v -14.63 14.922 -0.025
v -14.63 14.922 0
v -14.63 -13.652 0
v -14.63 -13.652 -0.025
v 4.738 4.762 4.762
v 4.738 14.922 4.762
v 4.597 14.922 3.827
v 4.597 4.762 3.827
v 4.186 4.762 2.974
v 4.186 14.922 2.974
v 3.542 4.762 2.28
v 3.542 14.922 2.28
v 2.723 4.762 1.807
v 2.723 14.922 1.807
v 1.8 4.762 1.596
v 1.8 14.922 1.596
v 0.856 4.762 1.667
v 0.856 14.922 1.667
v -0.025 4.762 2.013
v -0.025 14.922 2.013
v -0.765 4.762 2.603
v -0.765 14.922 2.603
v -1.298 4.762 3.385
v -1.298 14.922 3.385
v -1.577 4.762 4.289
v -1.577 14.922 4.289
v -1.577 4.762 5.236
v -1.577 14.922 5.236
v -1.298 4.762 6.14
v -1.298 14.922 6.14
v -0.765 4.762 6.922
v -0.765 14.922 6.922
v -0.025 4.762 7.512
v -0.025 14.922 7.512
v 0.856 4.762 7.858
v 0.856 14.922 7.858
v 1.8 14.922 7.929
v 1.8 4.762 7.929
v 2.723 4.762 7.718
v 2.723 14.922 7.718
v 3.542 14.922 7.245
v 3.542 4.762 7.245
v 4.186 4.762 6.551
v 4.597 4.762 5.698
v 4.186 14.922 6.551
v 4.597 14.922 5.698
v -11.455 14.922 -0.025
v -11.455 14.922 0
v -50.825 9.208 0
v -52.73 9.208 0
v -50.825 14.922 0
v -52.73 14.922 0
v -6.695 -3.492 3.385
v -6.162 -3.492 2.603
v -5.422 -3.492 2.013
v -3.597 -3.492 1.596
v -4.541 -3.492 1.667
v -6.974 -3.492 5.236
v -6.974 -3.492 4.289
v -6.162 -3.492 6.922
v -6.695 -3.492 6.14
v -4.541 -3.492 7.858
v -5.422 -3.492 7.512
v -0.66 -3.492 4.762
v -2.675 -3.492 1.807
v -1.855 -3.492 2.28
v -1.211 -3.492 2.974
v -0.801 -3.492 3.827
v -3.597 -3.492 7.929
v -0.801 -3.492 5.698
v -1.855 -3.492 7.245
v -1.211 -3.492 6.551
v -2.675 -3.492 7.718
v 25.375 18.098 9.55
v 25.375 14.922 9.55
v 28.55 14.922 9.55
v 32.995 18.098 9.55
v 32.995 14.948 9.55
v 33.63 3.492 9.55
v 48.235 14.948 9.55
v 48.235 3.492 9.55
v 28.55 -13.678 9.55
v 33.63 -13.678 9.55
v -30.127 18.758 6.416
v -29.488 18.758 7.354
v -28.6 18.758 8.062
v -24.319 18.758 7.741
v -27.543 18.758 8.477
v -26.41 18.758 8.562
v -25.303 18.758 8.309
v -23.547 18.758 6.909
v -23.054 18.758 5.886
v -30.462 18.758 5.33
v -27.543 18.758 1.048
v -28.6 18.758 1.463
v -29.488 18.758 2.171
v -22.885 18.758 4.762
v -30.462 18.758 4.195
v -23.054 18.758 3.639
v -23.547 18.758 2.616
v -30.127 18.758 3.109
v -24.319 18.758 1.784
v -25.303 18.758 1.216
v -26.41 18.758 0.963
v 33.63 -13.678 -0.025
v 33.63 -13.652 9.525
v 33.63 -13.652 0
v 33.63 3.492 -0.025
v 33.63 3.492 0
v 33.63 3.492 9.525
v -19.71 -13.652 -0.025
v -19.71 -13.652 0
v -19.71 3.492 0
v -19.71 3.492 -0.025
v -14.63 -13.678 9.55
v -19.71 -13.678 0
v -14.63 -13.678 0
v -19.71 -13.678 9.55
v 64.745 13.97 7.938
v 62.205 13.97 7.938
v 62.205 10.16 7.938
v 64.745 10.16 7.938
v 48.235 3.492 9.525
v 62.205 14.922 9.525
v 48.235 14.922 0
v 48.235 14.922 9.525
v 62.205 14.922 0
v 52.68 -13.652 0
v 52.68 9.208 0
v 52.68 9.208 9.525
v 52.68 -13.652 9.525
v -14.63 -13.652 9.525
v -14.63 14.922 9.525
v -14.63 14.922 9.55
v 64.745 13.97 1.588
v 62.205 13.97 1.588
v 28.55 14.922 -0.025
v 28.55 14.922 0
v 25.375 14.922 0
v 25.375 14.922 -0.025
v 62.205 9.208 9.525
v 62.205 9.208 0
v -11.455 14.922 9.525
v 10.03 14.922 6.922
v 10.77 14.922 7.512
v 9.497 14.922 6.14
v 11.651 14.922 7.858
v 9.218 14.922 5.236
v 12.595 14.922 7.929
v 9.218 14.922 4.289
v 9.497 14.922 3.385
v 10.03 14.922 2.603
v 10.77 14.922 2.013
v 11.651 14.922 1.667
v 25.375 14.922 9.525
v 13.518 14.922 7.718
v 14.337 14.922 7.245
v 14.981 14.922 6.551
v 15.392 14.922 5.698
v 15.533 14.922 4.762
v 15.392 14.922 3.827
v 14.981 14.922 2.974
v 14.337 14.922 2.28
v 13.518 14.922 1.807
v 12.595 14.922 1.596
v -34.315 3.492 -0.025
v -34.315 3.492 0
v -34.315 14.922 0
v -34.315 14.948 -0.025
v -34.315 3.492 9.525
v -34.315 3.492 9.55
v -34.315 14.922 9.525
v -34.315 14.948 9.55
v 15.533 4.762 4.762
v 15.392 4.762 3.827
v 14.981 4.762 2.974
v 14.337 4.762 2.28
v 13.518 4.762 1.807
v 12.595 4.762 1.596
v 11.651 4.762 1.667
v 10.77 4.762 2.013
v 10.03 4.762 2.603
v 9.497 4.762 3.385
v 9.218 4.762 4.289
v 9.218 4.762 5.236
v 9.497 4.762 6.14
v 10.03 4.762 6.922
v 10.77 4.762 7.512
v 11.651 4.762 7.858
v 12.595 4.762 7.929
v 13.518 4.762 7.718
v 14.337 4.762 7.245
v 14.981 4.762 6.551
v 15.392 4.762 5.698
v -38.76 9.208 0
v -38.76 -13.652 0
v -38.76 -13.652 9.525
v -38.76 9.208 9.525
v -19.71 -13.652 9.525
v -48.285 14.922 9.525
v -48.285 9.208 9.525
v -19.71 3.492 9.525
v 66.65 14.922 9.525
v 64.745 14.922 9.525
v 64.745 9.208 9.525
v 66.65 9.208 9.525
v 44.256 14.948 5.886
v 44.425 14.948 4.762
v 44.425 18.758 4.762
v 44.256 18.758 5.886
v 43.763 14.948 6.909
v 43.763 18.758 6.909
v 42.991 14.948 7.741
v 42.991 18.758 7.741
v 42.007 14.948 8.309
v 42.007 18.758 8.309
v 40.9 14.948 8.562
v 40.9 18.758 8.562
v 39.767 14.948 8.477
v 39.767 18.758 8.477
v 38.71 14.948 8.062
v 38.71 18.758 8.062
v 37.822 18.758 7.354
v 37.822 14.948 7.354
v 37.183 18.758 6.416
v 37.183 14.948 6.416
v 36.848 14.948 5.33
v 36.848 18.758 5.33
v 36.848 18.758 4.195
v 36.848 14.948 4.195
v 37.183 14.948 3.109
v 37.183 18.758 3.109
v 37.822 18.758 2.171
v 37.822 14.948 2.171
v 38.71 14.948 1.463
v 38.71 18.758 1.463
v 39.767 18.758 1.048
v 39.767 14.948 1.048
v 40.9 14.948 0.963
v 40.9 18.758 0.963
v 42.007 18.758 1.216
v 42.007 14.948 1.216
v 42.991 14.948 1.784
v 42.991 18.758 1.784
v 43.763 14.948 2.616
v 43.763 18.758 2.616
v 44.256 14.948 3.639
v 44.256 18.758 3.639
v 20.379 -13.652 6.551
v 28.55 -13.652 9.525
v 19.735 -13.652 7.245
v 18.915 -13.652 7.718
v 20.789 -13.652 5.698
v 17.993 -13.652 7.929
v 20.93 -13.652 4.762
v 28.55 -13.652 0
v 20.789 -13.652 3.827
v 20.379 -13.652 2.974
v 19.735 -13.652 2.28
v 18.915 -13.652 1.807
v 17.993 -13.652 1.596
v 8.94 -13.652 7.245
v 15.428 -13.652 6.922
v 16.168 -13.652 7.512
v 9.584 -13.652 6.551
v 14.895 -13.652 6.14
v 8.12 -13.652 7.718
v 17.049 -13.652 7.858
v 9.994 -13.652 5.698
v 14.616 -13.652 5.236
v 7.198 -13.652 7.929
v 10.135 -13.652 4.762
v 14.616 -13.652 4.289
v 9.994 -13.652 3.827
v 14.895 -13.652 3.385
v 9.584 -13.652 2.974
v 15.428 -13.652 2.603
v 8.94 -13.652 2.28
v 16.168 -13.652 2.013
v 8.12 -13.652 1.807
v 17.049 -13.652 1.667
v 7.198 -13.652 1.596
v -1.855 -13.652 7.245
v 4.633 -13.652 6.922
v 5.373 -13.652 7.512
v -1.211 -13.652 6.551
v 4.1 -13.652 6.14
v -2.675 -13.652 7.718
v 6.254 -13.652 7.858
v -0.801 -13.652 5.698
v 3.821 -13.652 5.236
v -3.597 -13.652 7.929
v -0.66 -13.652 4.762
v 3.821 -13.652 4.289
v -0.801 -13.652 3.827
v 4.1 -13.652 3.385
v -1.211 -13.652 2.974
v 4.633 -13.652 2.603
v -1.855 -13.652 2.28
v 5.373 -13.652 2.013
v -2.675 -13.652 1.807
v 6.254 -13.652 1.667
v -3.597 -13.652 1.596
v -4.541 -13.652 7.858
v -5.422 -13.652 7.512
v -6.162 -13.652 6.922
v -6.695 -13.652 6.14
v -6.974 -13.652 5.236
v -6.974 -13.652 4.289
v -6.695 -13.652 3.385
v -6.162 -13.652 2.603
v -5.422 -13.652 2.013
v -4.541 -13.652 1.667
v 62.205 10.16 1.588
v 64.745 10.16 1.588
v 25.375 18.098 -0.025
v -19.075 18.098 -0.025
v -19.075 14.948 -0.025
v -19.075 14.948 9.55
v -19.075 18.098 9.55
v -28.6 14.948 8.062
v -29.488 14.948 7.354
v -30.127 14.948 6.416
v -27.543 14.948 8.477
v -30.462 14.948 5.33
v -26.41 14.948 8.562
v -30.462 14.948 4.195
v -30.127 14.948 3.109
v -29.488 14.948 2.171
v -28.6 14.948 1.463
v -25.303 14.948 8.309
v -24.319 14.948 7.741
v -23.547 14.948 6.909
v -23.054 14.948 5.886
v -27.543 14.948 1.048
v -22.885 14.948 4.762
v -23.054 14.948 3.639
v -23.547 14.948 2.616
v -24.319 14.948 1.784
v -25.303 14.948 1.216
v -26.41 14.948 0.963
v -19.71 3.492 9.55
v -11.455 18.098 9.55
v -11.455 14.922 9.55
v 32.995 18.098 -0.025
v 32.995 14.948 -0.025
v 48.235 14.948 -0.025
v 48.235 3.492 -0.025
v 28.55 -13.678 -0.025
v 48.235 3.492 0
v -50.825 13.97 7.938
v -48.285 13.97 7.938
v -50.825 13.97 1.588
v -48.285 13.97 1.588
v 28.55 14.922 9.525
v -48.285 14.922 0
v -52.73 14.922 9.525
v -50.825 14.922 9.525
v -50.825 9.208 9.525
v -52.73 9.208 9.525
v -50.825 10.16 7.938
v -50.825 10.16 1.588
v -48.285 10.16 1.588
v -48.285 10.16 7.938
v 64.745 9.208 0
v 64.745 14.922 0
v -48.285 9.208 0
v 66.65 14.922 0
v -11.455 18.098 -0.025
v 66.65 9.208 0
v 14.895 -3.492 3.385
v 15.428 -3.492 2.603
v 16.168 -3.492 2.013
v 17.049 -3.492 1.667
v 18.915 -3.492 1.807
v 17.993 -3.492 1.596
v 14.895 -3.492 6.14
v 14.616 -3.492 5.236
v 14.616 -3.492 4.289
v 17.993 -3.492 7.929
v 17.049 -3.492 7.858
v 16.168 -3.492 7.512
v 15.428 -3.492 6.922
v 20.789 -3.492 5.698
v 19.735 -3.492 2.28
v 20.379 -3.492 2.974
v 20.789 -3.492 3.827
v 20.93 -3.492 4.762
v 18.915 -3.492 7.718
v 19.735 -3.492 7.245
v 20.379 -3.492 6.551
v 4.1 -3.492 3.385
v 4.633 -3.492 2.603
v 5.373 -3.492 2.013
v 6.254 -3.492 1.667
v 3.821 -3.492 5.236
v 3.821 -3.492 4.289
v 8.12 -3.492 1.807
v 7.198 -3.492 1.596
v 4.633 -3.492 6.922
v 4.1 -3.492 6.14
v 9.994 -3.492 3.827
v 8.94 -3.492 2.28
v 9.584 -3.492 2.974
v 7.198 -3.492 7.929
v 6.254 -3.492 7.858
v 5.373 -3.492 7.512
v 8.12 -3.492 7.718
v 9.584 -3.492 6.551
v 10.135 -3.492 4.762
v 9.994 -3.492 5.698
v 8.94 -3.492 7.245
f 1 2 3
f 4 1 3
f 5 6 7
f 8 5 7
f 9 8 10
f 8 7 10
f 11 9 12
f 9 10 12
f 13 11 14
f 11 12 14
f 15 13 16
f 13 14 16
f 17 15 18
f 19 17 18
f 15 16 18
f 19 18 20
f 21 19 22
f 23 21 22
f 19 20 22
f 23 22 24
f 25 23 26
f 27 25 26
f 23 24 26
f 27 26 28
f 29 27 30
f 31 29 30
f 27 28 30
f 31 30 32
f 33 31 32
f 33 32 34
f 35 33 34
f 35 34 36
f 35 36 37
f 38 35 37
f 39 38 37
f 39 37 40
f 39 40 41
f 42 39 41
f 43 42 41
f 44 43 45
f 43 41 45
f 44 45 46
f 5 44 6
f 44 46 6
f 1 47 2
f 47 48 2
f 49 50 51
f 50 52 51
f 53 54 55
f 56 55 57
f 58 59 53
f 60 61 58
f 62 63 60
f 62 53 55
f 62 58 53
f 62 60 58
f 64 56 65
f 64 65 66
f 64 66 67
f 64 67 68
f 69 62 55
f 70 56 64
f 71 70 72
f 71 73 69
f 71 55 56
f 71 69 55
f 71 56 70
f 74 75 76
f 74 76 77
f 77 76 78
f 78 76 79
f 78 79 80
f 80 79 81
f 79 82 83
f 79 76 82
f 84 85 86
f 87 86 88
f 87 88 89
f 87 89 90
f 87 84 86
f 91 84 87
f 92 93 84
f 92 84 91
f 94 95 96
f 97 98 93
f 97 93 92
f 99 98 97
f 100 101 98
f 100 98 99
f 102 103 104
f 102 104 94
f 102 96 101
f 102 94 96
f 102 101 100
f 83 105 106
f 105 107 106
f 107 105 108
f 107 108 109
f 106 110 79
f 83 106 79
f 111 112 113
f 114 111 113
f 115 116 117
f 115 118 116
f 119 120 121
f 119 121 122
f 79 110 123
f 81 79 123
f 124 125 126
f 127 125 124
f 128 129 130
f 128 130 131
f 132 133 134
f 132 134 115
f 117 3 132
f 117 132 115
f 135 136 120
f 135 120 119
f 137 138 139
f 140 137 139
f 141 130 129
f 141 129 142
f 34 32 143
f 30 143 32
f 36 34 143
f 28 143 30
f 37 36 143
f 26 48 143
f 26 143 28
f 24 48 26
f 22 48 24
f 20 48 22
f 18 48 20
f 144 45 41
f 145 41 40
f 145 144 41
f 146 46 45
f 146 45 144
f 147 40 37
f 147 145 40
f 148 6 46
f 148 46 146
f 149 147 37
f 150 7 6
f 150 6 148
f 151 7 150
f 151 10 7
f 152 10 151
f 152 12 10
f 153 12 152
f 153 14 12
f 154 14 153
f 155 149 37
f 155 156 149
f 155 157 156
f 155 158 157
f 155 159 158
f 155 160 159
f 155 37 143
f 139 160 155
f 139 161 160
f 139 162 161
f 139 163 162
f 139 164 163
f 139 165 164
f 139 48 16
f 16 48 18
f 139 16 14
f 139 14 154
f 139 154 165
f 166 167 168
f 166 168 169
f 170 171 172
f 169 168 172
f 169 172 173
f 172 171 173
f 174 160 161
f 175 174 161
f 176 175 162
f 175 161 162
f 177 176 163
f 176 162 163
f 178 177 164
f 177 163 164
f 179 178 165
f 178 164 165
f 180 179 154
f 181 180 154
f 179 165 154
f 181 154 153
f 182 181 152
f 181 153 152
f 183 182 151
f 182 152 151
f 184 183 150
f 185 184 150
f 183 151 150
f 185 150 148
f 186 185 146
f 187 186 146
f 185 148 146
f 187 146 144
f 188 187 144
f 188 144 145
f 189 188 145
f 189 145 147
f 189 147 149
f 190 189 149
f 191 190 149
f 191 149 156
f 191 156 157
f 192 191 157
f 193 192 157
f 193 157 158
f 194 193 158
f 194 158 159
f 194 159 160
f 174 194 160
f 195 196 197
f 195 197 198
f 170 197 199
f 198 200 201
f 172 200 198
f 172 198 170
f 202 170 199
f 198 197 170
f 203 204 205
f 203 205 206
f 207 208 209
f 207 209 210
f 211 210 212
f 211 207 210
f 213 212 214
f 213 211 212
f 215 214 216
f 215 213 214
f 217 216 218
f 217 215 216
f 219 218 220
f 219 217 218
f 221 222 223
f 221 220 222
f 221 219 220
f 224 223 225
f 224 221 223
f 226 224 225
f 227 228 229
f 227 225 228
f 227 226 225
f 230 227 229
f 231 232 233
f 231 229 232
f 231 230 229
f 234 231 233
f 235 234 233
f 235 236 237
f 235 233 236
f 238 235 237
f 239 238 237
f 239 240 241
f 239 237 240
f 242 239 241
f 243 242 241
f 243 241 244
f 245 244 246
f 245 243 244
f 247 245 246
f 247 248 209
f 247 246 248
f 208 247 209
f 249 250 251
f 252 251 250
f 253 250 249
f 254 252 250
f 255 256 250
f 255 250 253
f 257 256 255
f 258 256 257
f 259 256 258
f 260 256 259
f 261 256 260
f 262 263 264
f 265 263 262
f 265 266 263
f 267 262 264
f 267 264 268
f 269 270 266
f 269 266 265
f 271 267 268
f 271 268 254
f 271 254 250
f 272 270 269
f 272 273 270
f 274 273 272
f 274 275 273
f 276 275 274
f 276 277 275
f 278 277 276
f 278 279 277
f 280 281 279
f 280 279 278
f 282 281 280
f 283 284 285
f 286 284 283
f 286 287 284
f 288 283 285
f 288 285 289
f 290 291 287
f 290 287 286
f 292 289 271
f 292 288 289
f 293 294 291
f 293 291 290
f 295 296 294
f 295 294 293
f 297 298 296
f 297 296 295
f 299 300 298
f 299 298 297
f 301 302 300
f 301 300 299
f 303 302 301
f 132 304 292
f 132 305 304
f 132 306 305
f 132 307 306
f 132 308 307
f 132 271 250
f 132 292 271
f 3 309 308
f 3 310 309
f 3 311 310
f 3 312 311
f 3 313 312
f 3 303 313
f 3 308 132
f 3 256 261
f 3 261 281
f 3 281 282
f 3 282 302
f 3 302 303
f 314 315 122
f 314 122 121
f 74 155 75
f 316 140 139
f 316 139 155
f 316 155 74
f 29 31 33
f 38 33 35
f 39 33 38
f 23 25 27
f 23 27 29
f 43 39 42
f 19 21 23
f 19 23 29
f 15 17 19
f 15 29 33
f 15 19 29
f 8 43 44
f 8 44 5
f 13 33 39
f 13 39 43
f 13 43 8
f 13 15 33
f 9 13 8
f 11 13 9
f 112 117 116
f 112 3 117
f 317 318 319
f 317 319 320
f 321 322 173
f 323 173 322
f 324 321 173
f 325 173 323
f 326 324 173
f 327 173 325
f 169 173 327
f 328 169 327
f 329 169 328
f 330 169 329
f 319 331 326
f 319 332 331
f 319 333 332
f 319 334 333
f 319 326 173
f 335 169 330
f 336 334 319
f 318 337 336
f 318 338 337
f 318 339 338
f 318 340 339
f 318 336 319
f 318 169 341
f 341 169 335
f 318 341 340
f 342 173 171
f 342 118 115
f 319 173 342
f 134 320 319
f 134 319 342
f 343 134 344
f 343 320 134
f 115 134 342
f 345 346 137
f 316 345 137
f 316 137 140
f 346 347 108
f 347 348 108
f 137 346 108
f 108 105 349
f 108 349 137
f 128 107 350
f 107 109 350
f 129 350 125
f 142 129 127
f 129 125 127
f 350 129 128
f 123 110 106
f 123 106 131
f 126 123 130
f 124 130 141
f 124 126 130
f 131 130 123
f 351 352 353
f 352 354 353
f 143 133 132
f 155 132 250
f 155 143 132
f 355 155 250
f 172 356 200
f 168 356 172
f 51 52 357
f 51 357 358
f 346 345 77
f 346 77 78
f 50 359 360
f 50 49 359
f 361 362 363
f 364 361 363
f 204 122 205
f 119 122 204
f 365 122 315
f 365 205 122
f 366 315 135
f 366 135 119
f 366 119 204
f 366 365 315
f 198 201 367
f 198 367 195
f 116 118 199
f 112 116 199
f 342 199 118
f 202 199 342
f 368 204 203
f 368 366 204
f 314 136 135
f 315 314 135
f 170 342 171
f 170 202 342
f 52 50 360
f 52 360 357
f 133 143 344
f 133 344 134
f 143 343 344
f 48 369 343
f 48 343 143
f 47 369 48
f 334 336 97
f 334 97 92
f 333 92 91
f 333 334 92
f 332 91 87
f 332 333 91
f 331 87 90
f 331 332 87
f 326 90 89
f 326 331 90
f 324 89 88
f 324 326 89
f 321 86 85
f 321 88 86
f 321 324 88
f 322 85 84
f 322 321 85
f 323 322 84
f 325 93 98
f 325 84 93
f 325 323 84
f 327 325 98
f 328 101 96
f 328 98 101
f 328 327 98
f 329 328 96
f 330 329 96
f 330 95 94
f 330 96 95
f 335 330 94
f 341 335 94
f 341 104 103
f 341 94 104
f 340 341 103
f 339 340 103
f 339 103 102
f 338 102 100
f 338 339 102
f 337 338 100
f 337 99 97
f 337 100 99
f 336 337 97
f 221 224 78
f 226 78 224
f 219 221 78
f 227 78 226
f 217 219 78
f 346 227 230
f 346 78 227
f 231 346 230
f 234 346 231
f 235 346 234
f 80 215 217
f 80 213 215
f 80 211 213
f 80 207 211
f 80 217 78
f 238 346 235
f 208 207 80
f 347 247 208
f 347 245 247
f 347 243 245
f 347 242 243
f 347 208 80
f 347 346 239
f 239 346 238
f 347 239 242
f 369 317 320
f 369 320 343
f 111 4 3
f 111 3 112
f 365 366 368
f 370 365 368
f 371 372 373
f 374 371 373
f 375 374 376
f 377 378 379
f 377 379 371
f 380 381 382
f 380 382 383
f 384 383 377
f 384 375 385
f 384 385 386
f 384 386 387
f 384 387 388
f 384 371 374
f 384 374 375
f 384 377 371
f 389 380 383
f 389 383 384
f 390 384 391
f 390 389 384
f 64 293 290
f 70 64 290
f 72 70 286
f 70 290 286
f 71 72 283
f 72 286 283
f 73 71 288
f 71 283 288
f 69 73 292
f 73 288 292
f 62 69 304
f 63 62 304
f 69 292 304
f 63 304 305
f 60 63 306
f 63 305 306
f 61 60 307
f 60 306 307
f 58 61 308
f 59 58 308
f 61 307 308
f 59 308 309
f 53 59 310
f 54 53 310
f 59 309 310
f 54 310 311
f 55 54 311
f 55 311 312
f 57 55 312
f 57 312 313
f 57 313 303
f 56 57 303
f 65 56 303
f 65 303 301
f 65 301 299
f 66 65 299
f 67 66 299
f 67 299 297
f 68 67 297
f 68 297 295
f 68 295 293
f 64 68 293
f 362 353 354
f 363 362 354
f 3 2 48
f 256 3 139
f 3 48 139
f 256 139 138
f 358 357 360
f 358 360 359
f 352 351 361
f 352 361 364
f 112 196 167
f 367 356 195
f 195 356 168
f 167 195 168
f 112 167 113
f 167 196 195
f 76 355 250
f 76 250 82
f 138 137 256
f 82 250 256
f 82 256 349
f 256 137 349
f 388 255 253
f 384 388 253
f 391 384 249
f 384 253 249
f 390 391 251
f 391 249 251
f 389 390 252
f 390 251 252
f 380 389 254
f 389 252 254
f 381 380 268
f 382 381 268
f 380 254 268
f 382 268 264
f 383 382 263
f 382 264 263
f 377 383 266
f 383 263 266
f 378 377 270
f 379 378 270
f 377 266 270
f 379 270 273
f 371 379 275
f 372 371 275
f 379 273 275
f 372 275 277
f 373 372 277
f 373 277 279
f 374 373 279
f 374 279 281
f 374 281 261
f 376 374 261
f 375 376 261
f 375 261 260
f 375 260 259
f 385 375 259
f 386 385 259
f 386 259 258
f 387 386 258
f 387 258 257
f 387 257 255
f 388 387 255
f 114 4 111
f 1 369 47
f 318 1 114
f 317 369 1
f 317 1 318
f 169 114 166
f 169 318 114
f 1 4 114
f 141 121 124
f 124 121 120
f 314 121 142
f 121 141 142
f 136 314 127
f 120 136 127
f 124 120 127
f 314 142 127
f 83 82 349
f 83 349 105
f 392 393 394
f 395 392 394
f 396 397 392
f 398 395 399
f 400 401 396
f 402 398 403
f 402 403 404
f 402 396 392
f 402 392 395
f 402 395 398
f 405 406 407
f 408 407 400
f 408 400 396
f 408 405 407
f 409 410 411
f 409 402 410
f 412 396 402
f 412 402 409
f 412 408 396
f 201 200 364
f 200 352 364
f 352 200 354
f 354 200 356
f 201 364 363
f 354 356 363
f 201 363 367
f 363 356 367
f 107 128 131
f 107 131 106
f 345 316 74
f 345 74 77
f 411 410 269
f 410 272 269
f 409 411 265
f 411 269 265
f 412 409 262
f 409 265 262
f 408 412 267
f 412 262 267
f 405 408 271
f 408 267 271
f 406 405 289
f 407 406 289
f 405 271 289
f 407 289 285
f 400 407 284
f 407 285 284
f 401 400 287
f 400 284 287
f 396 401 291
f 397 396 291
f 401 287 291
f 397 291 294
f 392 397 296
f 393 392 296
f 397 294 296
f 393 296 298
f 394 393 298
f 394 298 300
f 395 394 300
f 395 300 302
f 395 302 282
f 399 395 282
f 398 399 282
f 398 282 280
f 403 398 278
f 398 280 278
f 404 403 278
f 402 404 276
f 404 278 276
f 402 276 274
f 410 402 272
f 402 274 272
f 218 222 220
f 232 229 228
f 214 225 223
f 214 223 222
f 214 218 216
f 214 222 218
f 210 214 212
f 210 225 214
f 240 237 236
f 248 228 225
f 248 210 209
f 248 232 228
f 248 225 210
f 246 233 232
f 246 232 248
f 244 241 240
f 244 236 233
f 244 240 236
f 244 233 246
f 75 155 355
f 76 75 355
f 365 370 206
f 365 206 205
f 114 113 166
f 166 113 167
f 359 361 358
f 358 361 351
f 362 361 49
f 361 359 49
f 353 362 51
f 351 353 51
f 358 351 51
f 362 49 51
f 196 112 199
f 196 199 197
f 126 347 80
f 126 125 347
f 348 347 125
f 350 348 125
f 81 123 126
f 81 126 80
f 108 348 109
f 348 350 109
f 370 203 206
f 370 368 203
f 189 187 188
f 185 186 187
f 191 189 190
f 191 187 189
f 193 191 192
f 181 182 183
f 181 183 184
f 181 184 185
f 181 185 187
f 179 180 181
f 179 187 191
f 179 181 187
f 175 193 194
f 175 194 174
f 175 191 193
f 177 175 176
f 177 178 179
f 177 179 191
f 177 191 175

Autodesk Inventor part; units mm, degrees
ref_plane "YZ Plane" through (0, 0, 0) normal (1, 0, 0) x (0, 1, 0)
ref_plane "XZ Plane" through (0, 0, 0) normal (0, 1, 0) x (-1, 0, 0)
sketch "Sketch1" plane through (0, 0, 0) normal (0, 0, 1) x (1, 0, 0)
  line L0 (52.6803, 14.9225) -> (52.6803, -13.6525)
  line L1 (52.6803, -13.6525) -> (-38.7597, -13.6525)
  line L2 (-38.7597, -13.6525) -> (-38.7597, 14.9225)
  line L3 (-19.0747, 18.0975) -> (-11.4547, 18.0975)
  line L4 (-11.4547, 18.0975) -> (-11.4547, 14.9225)
  line L5 (-19.0747, 14.9225) -> (-19.0747, 18.0975)
  line L6 (25.3753, 18.0975) -> (32.9953, 18.0975)
  line L7 (32.9953, 18.0975) -> (32.9953, 14.9225)
  line L8 (25.3753, 14.9225) -> (25.3753, 18.0975)
  line L9 (32.9953, 14.9225) -> (52.6803, 14.9225)
  line L10 (-38.7597, 14.9225) -> (-19.0747, 14.9225)
  line L11 (-11.4547, 14.9225) -> (25.3753, 14.9225)
  point P0 (0, 0)
  dimension "d0" = 28.575
  dimension "d1" = 91.44
  dimension "d2" = 7.62
  dimension "d3" = 7.62
  dimension "d4" = 3.175
  dimension "d5" = 3.175
  dimension "d6" = 3.175
  dimension "d7" = 3.175
  dimension "d8" = 19.685
  dimension "d9" = 19.685
  dimension "d10" = 36.83
extrude "Extrusion1" add sketch "Sketch1" along normal blind 9.525
sketch "Sketch2" plane through (0, 0, 9.525) normal (0, 0, 1) x (1, 0, 0)
  line L0 (-38.7597, 14.9225) -> (-19.0747, 14.9225) projected
  line L1 (52.6803, -13.6525) -> (-38.7597, -13.6525) projected
  line L2 (32.9953, 14.9225) -> (52.6803, 14.9225) projected
  line L3 (32.9953, 18.0975) -> (32.9953, 14.9225) projected
  line L4 (25.3753, 18.0975) -> (32.9953, 18.0975) projected
  line L5 (25.3753, 14.9225) -> (25.3753, 18.0975) projected
  line L6 (-11.4547, 18.0975) -> (-11.4547, 14.9225) projected
  line L7 (-19.0747, 18.0975) -> (-11.4547, 18.0975) projected
  line L8 (-19.0747, 14.9225) -> (-19.0747, 18.0975) projected
  line L9 (-11.4547, 14.9225) -> (-14.6297, 14.9225)
  line L10 (-14.6297, 14.9225) -> (-14.6297, -13.6525)
  line L11 (25.3753, 14.9225) -> (28.5503, 14.9225)
  line L12 (28.5503, 14.9225) -> (28.5503, -13.6525)
  line L13 (33.6303, -13.6525) -> (33.6303, 3.4925)
  line L14 (33.6303, 3.4925) -> (48.2353, 3.4925)
  line L15 (48.2353, 3.4925) -> (48.2353, 14.9225)
  line L16 (-19.7097, -13.6525) -> (-19.7097, 3.4925)
  line L17 (-19.7097, 3.4925) -> (-34.3147, 3.4925)
  line L18 (-34.3147, 3.4925) -> (-34.3147, 14.9225)
  point P0 (0, 0)
  dimension "d13" = 3.175
  dimension "d14" = 3.175
  dimension "d15" = 5.08
  dimension "d16" = 5.08
  dimension "d17" = 19.685
  dimension "d18" = 19.685
  dimension "d19" = 11.43
  dimension "d20" = 11.43
extrude "Extrusion2" add sketch "Sketch2" along normal blind 0.0254
sketch "Sketch3" plane through (0, 0, 0) normal (0, 0, -1) x (-1, 0, 0)
  line L0 (19.0747, 14.9225) -> (38.7597, 14.9225) projected
  line L1 (19.0747, 18.0975) -> (19.0747, 14.9225) projected
  line L2 (11.4547, 18.0975) -> (19.0747, 18.0975) projected
  line L3 (11.4547, 14.9225) -> (11.4547, 18.0975) projected
  line L4 (-25.3753, 18.0975) -> (-25.3753, 14.9225) projected
  line L5 (-32.9953, 18.0975) -> (-25.3753, 18.0975) projected
  line L6 (-32.9953, 14.9225) -> (-32.9953, 18.0975) projected
  line L7 (-52.6803, 14.9225) -> (-32.9953, 14.9225) projected
  line L8 (38.7597, -13.6525) -> (-52.6803, -13.6525) projected
  line L9 (-28.5503, -13.6525) -> (-28.5503, 14.9225) projected
  line L10 (-28.5503, 14.9225) -> (-25.3753, 14.9225) projected
  line L11 (-48.2353, 14.9225) -> (-48.2353, 3.4925) projected
  line L12 (-48.2353, 3.4925) -> (-33.6303, 3.4925) projected
  line L13 (-33.6303, 3.4925) -> (-33.6303, -13.6525) projected
  line L14 (14.6297, 14.9225) -> (14.6297, -13.6525) projected
  line L15 (11.4547, 14.9225) -> (14.6297, 14.9225) projected
  line L16 (34.3147, 3.4925) -> (34.3147, 14.9225) projected
  line L17 (19.7097, 3.4925) -> (34.3147, 3.4925) projected
  line L18 (19.7097, -13.6525) -> (19.7097, 3.4925) projected
  point P0 (0, 0)
extrude "Extrusion3" add sketch "Sketch3" along normal blind 0.0254
sketch "Sketch4" plane through (-38.7597, -13.6525, 0) normal (0, -1, 0) x (1, 0, 0)
  line L0 (72.39, 9.5504) -> (67.31, 9.5504) projected
  line L1 (67.31, 9.525) -> (67.31, 9.5504) projected
  line L2 (67.31, -0.0254) -> (72.39, -0.0254) projected
  line L3 (72.39, 0) -> (72.39, -0.0254) projected
  line L4 (19.685, -0.0254) -> (4.445, -0.0254) projected
  line L5 (27.305, -0.0254) -> (19.685, -0.0254) projected
  line L6 (24.13, -0.0254) -> (27.305, -0.0254) projected
  line L7 (19.05, -0.0254) -> (24.13, -0.0254) projected
  line L8 (4.445, -0.0254) -> (19.05, -0.0254) projected
  line L9 (72.39, 0) -> (72.39, 9.5504)
  line L10 (24.13, -0.0254) -> (24.13, 9.5504)
  line L11 (19.05, -0.0254) -> (19.05, 9.525)
  line L12 (67.31, -0.0254) -> (67.31, 9.525)
  line L13 (91.44, 0) -> (91.44, 9.525) projected
  line L14 (24.13, 0) -> (19.05, 0)
  line L15 (19.05, 9.5504) -> (24.13, 9.525)
  line L16 (24.13, 0) -> (19.05, 0)
  line L17 (19.05, 0) -> (19.05, 9.5504)
  line L18 (19.05, 9.5504) -> (24.13, 9.5504)
  line L19 (24.13, 9.5504) -> (24.13, 0)
  point P0 (38.7597, 0)
extrude "Extrusion4" add sketch "Sketch4" along normal blind 0.0254 contours L9 L3 L2 L12 L1 L0 | L11 L17 L15 L10 L14 | L15 L18 L10
sketch "Sketch5" plane through (52.6803, 14.9225, 9.525) normal (0, 1, 0) x (1, 0, 0)
  line L0 (-4.445, 9.5504) -> (-19.685, 9.5504) projected
  line L1 (-19.685, -0.0254) -> (-4.445, -0.0254) projected
  line L2 (-64.135, 0) -> (-27.305, 0) projected
  line L3 (-27.305, 9.525) -> (-27.305, 0) projected
  line L4 (-27.305, 9.525) -> (-64.135, 9.525) projected
  line L5 (-64.135, 9.525) -> (-64.135, 0) projected
  line L6 (-91.44, 0) -> (-86.995, 0) projected
  line L7 (-86.995, 0) -> (-86.995, -0.0254) projected
  line L8 (-86.995, -0.0254) -> (-71.755, -0.0254) projected
  line L9 (-71.755, 9.5504) -> (-71.755, -0.0254) projected
  line L10 (-71.755, 9.5504) -> (-86.995, 9.5504) projected
  line L11 (-86.995, 9.525) -> (-86.995, 9.5504) projected
  line L12 (-86.995, 9.525) -> (-91.44, 9.525) projected
  line L13 (-91.44, 9.525) -> (-91.44, 0) projected
  line L14 (-71.755, 9.5504) -> (-71.755, -0.0254) projected
  line L15 (-27.305, 9.5504) -> (-27.305, -0.0254) projected
  line L16 (-19.685, 9.5504) -> (-19.685, -0.0254) projected
  line L17 (-64.135, 9.5504) -> (-64.135, -0.0254) projected
  line L18 (-4.445, 9.5504) -> (-4.445, -0.0254)
  line L19 (-86.995, -0.0254) -> (-86.995, 9.525)
  point P0 (-52.6803, 9.525)
extrude "Extrusion5" add sketch "Sketch5" along normal blind 0.0254 contours L18 L1 L16 L0 | L19 L11 L10 L9 L8 L7
sketch "Sketch6" plane through (0, 0, 0) normal (0, 0, -1) x (-1, 0, 0)
  line L0 (-52.6803, -13.6525) -> (-52.6803, 14.9225) projected
  line L1 (19.7097, 3.4925) -> (19.7097, -13.6525) projected
  line L2 (38.7597, -13.6525) -> (19.7097, -13.6525) projected
  line L3 (38.7597, 14.9225) -> (38.7597, -13.6525) projected
  line L4 (34.3147, 14.9225) -> (38.7597, 14.9225) projected
  line L5 (34.3147, 14.9225) -> (34.3147, 3.4925) projected
  line L6 (34.3147, 3.4925) -> (19.7097, 3.4925) projected
  line L7 (-62.2053, 14.9225) -> (-52.6803, 14.9225)
  line L8 (-52.6803, 14.9225) -> (-52.6803, 9.2075)
  line L9 (-52.6803, 9.2075) -> (-62.2053, 9.2075)
  line L10 (-62.2053, 9.2075) -> (-62.2053, 14.9225)
  line L11 (38.7597, 14.9225) -> (48.2847, 14.9225)
  line L12 (48.2847, 14.9225) -> (48.2847, 9.2075)
  line L13 (48.2847, 9.2075) -> (38.7597, 9.2075)
  line L14 (38.7597, 9.2075) -> (38.7597, 14.9225)
  point P0 (0, 0)
  dimension "d29" = 9.525
  dimension "d30" = 9.525
  dimension "d31" = 5.715
  dimension "d32" = 5.715
extrude "Extrusion6" add sketch "Sketch6" against normal blind 9.525 contours L9 L10 L7 L0 | L3 L11 L12 L13
ref_plane "Work Plane1" through (0, 0, 4.7625) normal (0, 0, 1) x (1, 0, 0)
sketch "Sketch7" plane through (0, 0, 4.7625) normal (0, 0, 1) x (1, 0, 0)
  line L0 (-19.7097, 3.4925) -> (-19.7097, -13.6525) projected
  line L1 (-38.7597, -13.6525) -> (-19.7097, -13.6525) projected
  line L2 (-38.7597, 9.2075) -> (-38.7597, -13.6525) projected
  line L3 (-38.7597, 9.2075) -> (-48.2847, 9.2075) projected
  line L4 (-48.2847, 9.2075) -> (-48.2847, 14.9225) projected
  line L5 (-34.3147, 14.9225) -> (-48.2847, 14.9225) projected
  line L6 (-34.3147, 14.9225) -> (-34.3147, 3.4925) projected
  line L7 (-34.3147, 3.4925) -> (-19.7097, 3.4925) projected
  line L8 (48.2353, 3.4925) -> (48.2353, 14.9225) projected
  line L9 (48.2353, 14.9225) -> (62.2053, 14.9225) projected
  line L10 (62.2053, 14.9225) -> (62.2053, 9.2075) projected
  line L11 (62.2053, 9.2075) -> (52.6803, 9.2075) projected
  line L12 (52.6803, -13.6525) -> (52.6803, 9.2075) projected
  line L13 (33.6303, -13.6525) -> (52.6803, -13.6525) projected
  line L14 (33.6303, -13.6525) -> (33.6303, 3.4925) projected
  line L15 (33.6303, 3.4925) -> (48.2353, 3.4925) projected
  line L16 (-48.2847, 13.97) -> (-50.8247, 13.97)
  line L17 (-50.8247, 13.97) -> (-50.8247, 10.16)
  line L18 (-50.8247, 10.16) -> (-48.2847, 10.16)
  line L19 (-48.2847, 10.16) -> (-48.2847, 13.97)
  line L20 (62.2053, 13.97) -> (64.7453, 13.97)
  line L21 (64.7453, 13.97) -> (64.7453, 10.16)
  line L22 (64.7453, 10.16) -> (62.2053, 10.16)
  line L23 (62.2053, 10.16) -> (62.2053, 13.97)
  point P0 (0, 0)
  dimension "d36" = 2.54
  dimension "d37" = 2.54
  dimension "d38" = 3.81
  dimension "d39" = 3.81
  dimension "d40" = 0.9525
  dimension "d41" = 0.9525
  dimension "d42" = 0.9525
extrude "Extrusion7" add sketch "Sketch7" along normal mid plane 6.35 contours L4 L18 L17 L16 | L20 L21 L22 L10
sketch "Sketch8" plane through (0, 0, 4.7625) normal (0, 0, 1) x (1, 0, 0)
  line L0 (-48.2847, 13.97) -> (-48.2847, 10.16) projected
  line L1 (-50.8247, 13.97) -> (-48.2847, 13.97) projected
  line L2 (-50.8247, 10.16) -> (-50.8247, 13.97) projected
  line L3 (-48.2847, 10.16) -> (-50.8247, 10.16) projected
  line L4 (62.2053, 13.97) -> (64.7453, 13.97) projected
  line L5 (62.2053, 10.16) -> (62.2053, 13.97) projected
  line L6 (64.7453, 10.16) -> (62.2053, 10.16) projected
  line L7 (64.7453, 13.97) -> (64.7453, 10.16) projected
  line L8 (-52.7297, 14.9225) -> (-50.8247, 14.9225)
  line L9 (-50.8247, 14.9225) -> (-50.8247, 9.2075)
  line L10 (-50.8247, 9.2075) -> (-52.7297, 9.2075)
  line L11 (-52.7297, 9.2075) -> (-52.7297, 14.9225)
  line L12 (64.7453, 14.9225) -> (66.6503, 14.9225)
  line L13 (66.6503, 14.9225) -> (66.6503, 9.2075)
  line L14 (66.6503, 9.2075) -> (64.7453, 9.2075)
  line L15 (64.7453, 9.2075) -> (64.7453, 14.9225)
  line L16 (48.2353, 14.9225) -> (62.2053, 14.9225) projected
  line L17 (62.2053, 9.2075) -> (52.6803, 9.2075) projected
  line L18 (-38.7597, 9.2075) -> (-48.2847, 9.2075) projected
  line L19 (-48.2847, 14.9225) -> (-34.3147, 14.9225) projected
  point P0 (0, 0)
  dimension "d45" = 0
  dimension "d46" = 0
  dimension "d47" = 0
  dimension "d48" = 0
  dimension "d49" = 1.905
  dimension "d50" = 5.715
  dimension "d51" = 0
  dimension "d52" = 1.905
  dimension "d53" = 0
extrude "Extrusion8" add sketch "Sketch8" along normal mid plane 9.525 contours L2 L9 L10 L11 L8 | L15 L12 L13 L14 L7
sketch "Sketch9" plane through (52.6803, 14.9479, 9.525) normal (0, 1, 0) x (1, 0, 0)
  line L0 (-4.445, 9.5504) -> (-4.445, -0.0254) projected
  line L1 (-19.685, 9.5504) -> (-4.445, 9.5504) projected
  line L2 (-19.685, -0.0254) -> (-19.685, 9.5504) projected
  line L3 (-4.445, -0.0254) -> (-19.685, -0.0254) projected
  circle A0 centre (-12.065, 4.7625) radius 3.81
  circle A1 centre (-79.375, 4.7625) radius 3.81
  point P0 (-52.6803, 9.525)
  dimension "d56" = 7.62
  dimension "d57" = 7.62
extrude "Extrusion9" add sketch "Sketch9" along normal blind 3.81 contours A0 | A1
sketch "Sketch10" plane through (-14.6297, -13.6525, 9.525) normal (0, -1, 0) x (1, 0, 0)
  line L0 (43.18, -9.525) -> (43.18, 0) projected
  line L1 (0, 0) -> (0, -9.525) projected
  circle A0 centre (10.795, -4.7625) radius 3.175
  circle A1 centre (21.59, -4.7625) radius 3.175
  circle A2 centre (32.385, -4.7625) radius 3.175
  point P0 (14.6297, -9.525)
  dimension "d60" = 6.35
  dimension "d61" = 10.795
  dimension "d62" = 10.795
  dimension "d63" = 10.795
  dimension "d64" = 10.795
extrude "Extrusion10" cut sketch "Sketch10" against normal blind 10.16
sketch "Sketch11" plane through (-11.4547, 14.9225, 9.525) normal (0, 1, 0) x (1, 0, 0)
  line L0 (36.83, 9.525) -> (36.83, 0) projected
  line L1 (0, 9.525) -> (0, 0) projected
  circle A0 centre (23.8125, 4.7625) radius 3.175
  circle A1 centre (13.0175, 4.7625) radius 3.175
  line L2 (23.8125, 4.7625) -> (36.83, 4.7625)
  line L3 (13.0175, 4.7625) -> (0, 4.7625)
  point P0 (11.4547, 9.525)
  dimension "d67" = 6.35
  dimension "d68" = 10.795
extrude "Extrusion11" cut sketch "Sketch11" against normal blind 10.16
sketch "Sketch12" plane through (0, 0, 9.525) normal (0, 0, 1) x (1, 0, 0)
  line L0 (-11.4547, 14.9225) -> (25.3753, 14.9225) projected
  line L1 (-14.6297, 14.9225) -> (-14.6297, -13.6525) projected
  line L2 (28.5503, -13.6525) -> (-14.6297, -13.6525) projected
  line L3 (-10.8197, -9.525) -> (-10.8197, 10.795) construction
  line L4 (-10.8197, 10.795) -> (-6.9164, 10.795) construction
  line L5 (-6.9164, 10.795) -> (-6.9164, -9.525) construction
  line L6 (-6.9164, -9.525) -> (-10.8197, -9.525) construction
  point P0 (0, 0)
  dimension "d72" = 20.32
  dimension "d84" = 3.81
  dimension "d85" = 4.1275
  dimension "d86" = 4.1275
decal "Decal1"
properties part number "Festo Valve 1764"
